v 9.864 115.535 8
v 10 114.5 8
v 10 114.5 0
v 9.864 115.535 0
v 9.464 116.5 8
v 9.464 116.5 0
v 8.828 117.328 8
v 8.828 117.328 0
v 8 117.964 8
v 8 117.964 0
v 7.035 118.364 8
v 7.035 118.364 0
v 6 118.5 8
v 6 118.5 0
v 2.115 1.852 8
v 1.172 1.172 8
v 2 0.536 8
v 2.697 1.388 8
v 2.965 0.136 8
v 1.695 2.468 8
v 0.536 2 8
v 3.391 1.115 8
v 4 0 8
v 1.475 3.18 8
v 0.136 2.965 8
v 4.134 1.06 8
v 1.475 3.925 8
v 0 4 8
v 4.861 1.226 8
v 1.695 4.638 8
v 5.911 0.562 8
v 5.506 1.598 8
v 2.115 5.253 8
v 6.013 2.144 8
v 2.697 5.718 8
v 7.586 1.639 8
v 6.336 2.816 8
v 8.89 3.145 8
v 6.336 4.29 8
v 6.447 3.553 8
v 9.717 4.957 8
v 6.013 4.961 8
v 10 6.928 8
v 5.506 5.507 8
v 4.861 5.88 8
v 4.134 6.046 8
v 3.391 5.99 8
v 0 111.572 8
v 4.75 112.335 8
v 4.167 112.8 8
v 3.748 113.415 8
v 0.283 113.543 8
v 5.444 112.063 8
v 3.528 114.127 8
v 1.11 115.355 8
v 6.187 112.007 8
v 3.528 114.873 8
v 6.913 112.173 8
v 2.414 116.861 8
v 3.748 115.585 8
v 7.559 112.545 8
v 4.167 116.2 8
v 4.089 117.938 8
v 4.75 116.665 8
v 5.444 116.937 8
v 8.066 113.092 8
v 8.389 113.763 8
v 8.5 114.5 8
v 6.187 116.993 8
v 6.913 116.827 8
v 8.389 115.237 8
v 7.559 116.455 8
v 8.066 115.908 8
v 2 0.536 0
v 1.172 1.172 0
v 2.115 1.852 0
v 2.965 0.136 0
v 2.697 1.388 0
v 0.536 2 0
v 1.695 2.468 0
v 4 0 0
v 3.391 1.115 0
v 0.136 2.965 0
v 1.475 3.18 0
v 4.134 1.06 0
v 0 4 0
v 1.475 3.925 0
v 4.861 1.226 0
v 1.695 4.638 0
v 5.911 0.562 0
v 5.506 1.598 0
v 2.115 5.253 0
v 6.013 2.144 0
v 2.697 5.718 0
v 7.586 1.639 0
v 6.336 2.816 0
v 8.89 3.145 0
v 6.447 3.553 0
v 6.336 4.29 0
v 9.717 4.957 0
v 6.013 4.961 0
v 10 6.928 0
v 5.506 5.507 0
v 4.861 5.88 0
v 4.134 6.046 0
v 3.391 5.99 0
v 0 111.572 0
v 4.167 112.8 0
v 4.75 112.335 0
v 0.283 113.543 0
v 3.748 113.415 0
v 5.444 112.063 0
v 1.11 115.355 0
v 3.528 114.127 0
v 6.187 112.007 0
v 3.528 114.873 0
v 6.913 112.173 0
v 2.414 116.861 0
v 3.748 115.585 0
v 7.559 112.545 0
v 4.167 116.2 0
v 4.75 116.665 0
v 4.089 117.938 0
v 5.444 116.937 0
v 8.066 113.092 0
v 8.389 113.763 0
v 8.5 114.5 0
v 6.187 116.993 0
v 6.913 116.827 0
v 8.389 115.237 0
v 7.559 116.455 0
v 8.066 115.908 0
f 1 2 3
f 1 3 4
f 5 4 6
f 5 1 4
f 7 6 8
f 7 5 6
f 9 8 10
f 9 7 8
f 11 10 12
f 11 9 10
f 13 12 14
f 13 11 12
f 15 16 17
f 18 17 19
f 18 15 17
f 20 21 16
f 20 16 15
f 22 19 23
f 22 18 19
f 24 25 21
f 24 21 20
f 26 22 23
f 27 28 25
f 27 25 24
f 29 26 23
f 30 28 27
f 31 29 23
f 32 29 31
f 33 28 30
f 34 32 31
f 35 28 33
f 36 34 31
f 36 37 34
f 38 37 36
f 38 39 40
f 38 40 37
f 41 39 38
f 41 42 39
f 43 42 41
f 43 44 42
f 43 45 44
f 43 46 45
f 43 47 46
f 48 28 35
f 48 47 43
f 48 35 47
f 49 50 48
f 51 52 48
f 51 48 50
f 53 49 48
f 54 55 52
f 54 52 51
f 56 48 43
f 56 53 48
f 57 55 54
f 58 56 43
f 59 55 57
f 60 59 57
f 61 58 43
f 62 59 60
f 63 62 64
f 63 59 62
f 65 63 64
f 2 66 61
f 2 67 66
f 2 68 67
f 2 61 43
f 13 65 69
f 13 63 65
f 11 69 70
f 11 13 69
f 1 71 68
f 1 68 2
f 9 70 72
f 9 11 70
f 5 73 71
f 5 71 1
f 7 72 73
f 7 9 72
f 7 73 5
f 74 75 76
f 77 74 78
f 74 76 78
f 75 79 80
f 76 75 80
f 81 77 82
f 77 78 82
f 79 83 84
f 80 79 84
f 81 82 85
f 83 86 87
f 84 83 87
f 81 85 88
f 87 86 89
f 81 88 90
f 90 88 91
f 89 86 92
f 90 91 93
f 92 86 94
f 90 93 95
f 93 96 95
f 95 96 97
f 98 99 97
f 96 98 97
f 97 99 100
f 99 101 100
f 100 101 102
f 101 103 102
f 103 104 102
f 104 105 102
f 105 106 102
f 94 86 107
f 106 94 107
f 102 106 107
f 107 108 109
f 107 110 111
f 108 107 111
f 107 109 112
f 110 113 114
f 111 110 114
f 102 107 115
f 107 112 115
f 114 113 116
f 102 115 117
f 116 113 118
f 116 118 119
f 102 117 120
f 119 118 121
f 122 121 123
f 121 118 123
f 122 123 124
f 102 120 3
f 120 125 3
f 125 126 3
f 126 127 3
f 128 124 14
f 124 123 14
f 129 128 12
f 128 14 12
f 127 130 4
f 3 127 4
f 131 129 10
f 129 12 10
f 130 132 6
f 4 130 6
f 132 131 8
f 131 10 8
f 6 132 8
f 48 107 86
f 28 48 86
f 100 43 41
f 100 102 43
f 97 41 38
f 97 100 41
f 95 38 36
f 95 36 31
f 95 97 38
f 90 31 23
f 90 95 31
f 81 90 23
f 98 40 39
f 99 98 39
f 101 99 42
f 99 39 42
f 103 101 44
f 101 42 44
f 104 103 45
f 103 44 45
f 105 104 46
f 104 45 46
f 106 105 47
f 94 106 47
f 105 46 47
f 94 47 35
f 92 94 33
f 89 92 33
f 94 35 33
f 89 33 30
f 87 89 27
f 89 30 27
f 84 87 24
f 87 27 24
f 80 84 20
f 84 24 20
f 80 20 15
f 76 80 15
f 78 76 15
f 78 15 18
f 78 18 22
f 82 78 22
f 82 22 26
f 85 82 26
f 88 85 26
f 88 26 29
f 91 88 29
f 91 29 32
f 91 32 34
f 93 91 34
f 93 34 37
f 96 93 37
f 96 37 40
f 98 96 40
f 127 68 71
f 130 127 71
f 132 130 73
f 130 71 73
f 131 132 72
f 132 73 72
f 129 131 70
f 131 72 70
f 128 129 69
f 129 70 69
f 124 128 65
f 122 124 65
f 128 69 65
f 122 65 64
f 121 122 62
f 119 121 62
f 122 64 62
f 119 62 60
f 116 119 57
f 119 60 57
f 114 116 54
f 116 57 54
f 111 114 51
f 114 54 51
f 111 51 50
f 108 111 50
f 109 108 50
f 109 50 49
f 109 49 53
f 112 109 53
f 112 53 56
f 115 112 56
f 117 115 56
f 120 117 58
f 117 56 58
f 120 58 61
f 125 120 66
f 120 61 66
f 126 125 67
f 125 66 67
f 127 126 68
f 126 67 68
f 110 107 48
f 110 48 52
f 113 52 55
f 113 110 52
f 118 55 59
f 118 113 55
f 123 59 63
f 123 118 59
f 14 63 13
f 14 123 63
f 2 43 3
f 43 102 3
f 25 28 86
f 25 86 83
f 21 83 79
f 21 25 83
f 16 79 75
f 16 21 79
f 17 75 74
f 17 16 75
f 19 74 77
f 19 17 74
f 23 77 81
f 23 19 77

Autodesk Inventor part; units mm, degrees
ref_plane "YZ Plane" through (0, 0, 0) normal (1, 0, 0) x (0, 1, 0)
ref_plane "XZ Plane" through (0, 0, 0) normal (0, 1, 0) x (-1, 0, 0)
ref_plane "XY Plane" through (0, 0, 0) normal (0, 0, 1) x (1, 0, 0)
sketch "Sketch1" plane through (0, 0, 0) normal (0, 0, 1) x (1, 0, 0)
  line L0 (0, 0) -> (10, 0)
  line L1 (10, 0) -> (10, 118.5)
  line L2 (10, 118.5) -> (0, 118.5)
  line L3 (0, 118.5) -> (0, 0)
  dimension "d1" = 10
  dimension "d14" = 118.5
extrude "Extrusion1" add sketch "Sketch1" along normal blind 8
sketch "Sketch2" plane through (0, 0, 8) normal (0, 0, 1) x (1, 0, 0)
  circle A0 centre (3.9473, 3.5528) radius 2.5
  circle A1 centre (6.4473, 196.4185) radius 2.5
  point P0 (0, 0)
  dimension "d4" = 5
  dimension "d5" = 5
extrude "Extrusion2" cut sketch "Sketch2" against normal through all
sketch "Sketch3" plane through (0, 0, 8) normal (0, 0, 1) x (1, 0, 0)
  circle A0 centre (6, 114.5) radius 2.5
  line L0 (10, 118.5) -> (0, 118.5) projected
  line L1 (10, 0) -> (10, 118.5) projected
  point P0 (0, 0)
  dimension "d8" = 5
  dimension "d9" = 4
  dimension "d10" = 4
extrude "Extrusion3" cut sketch "Sketch3" against normal through all
fillet "Fillet3" radius 4 2 edges at (10, 118.5, 4) (0, 0, 4)
fillet "Fillet4" radius 7 2 edges at (10, 0, 4) (0, 118.5, 4)
properties part number "rod"
